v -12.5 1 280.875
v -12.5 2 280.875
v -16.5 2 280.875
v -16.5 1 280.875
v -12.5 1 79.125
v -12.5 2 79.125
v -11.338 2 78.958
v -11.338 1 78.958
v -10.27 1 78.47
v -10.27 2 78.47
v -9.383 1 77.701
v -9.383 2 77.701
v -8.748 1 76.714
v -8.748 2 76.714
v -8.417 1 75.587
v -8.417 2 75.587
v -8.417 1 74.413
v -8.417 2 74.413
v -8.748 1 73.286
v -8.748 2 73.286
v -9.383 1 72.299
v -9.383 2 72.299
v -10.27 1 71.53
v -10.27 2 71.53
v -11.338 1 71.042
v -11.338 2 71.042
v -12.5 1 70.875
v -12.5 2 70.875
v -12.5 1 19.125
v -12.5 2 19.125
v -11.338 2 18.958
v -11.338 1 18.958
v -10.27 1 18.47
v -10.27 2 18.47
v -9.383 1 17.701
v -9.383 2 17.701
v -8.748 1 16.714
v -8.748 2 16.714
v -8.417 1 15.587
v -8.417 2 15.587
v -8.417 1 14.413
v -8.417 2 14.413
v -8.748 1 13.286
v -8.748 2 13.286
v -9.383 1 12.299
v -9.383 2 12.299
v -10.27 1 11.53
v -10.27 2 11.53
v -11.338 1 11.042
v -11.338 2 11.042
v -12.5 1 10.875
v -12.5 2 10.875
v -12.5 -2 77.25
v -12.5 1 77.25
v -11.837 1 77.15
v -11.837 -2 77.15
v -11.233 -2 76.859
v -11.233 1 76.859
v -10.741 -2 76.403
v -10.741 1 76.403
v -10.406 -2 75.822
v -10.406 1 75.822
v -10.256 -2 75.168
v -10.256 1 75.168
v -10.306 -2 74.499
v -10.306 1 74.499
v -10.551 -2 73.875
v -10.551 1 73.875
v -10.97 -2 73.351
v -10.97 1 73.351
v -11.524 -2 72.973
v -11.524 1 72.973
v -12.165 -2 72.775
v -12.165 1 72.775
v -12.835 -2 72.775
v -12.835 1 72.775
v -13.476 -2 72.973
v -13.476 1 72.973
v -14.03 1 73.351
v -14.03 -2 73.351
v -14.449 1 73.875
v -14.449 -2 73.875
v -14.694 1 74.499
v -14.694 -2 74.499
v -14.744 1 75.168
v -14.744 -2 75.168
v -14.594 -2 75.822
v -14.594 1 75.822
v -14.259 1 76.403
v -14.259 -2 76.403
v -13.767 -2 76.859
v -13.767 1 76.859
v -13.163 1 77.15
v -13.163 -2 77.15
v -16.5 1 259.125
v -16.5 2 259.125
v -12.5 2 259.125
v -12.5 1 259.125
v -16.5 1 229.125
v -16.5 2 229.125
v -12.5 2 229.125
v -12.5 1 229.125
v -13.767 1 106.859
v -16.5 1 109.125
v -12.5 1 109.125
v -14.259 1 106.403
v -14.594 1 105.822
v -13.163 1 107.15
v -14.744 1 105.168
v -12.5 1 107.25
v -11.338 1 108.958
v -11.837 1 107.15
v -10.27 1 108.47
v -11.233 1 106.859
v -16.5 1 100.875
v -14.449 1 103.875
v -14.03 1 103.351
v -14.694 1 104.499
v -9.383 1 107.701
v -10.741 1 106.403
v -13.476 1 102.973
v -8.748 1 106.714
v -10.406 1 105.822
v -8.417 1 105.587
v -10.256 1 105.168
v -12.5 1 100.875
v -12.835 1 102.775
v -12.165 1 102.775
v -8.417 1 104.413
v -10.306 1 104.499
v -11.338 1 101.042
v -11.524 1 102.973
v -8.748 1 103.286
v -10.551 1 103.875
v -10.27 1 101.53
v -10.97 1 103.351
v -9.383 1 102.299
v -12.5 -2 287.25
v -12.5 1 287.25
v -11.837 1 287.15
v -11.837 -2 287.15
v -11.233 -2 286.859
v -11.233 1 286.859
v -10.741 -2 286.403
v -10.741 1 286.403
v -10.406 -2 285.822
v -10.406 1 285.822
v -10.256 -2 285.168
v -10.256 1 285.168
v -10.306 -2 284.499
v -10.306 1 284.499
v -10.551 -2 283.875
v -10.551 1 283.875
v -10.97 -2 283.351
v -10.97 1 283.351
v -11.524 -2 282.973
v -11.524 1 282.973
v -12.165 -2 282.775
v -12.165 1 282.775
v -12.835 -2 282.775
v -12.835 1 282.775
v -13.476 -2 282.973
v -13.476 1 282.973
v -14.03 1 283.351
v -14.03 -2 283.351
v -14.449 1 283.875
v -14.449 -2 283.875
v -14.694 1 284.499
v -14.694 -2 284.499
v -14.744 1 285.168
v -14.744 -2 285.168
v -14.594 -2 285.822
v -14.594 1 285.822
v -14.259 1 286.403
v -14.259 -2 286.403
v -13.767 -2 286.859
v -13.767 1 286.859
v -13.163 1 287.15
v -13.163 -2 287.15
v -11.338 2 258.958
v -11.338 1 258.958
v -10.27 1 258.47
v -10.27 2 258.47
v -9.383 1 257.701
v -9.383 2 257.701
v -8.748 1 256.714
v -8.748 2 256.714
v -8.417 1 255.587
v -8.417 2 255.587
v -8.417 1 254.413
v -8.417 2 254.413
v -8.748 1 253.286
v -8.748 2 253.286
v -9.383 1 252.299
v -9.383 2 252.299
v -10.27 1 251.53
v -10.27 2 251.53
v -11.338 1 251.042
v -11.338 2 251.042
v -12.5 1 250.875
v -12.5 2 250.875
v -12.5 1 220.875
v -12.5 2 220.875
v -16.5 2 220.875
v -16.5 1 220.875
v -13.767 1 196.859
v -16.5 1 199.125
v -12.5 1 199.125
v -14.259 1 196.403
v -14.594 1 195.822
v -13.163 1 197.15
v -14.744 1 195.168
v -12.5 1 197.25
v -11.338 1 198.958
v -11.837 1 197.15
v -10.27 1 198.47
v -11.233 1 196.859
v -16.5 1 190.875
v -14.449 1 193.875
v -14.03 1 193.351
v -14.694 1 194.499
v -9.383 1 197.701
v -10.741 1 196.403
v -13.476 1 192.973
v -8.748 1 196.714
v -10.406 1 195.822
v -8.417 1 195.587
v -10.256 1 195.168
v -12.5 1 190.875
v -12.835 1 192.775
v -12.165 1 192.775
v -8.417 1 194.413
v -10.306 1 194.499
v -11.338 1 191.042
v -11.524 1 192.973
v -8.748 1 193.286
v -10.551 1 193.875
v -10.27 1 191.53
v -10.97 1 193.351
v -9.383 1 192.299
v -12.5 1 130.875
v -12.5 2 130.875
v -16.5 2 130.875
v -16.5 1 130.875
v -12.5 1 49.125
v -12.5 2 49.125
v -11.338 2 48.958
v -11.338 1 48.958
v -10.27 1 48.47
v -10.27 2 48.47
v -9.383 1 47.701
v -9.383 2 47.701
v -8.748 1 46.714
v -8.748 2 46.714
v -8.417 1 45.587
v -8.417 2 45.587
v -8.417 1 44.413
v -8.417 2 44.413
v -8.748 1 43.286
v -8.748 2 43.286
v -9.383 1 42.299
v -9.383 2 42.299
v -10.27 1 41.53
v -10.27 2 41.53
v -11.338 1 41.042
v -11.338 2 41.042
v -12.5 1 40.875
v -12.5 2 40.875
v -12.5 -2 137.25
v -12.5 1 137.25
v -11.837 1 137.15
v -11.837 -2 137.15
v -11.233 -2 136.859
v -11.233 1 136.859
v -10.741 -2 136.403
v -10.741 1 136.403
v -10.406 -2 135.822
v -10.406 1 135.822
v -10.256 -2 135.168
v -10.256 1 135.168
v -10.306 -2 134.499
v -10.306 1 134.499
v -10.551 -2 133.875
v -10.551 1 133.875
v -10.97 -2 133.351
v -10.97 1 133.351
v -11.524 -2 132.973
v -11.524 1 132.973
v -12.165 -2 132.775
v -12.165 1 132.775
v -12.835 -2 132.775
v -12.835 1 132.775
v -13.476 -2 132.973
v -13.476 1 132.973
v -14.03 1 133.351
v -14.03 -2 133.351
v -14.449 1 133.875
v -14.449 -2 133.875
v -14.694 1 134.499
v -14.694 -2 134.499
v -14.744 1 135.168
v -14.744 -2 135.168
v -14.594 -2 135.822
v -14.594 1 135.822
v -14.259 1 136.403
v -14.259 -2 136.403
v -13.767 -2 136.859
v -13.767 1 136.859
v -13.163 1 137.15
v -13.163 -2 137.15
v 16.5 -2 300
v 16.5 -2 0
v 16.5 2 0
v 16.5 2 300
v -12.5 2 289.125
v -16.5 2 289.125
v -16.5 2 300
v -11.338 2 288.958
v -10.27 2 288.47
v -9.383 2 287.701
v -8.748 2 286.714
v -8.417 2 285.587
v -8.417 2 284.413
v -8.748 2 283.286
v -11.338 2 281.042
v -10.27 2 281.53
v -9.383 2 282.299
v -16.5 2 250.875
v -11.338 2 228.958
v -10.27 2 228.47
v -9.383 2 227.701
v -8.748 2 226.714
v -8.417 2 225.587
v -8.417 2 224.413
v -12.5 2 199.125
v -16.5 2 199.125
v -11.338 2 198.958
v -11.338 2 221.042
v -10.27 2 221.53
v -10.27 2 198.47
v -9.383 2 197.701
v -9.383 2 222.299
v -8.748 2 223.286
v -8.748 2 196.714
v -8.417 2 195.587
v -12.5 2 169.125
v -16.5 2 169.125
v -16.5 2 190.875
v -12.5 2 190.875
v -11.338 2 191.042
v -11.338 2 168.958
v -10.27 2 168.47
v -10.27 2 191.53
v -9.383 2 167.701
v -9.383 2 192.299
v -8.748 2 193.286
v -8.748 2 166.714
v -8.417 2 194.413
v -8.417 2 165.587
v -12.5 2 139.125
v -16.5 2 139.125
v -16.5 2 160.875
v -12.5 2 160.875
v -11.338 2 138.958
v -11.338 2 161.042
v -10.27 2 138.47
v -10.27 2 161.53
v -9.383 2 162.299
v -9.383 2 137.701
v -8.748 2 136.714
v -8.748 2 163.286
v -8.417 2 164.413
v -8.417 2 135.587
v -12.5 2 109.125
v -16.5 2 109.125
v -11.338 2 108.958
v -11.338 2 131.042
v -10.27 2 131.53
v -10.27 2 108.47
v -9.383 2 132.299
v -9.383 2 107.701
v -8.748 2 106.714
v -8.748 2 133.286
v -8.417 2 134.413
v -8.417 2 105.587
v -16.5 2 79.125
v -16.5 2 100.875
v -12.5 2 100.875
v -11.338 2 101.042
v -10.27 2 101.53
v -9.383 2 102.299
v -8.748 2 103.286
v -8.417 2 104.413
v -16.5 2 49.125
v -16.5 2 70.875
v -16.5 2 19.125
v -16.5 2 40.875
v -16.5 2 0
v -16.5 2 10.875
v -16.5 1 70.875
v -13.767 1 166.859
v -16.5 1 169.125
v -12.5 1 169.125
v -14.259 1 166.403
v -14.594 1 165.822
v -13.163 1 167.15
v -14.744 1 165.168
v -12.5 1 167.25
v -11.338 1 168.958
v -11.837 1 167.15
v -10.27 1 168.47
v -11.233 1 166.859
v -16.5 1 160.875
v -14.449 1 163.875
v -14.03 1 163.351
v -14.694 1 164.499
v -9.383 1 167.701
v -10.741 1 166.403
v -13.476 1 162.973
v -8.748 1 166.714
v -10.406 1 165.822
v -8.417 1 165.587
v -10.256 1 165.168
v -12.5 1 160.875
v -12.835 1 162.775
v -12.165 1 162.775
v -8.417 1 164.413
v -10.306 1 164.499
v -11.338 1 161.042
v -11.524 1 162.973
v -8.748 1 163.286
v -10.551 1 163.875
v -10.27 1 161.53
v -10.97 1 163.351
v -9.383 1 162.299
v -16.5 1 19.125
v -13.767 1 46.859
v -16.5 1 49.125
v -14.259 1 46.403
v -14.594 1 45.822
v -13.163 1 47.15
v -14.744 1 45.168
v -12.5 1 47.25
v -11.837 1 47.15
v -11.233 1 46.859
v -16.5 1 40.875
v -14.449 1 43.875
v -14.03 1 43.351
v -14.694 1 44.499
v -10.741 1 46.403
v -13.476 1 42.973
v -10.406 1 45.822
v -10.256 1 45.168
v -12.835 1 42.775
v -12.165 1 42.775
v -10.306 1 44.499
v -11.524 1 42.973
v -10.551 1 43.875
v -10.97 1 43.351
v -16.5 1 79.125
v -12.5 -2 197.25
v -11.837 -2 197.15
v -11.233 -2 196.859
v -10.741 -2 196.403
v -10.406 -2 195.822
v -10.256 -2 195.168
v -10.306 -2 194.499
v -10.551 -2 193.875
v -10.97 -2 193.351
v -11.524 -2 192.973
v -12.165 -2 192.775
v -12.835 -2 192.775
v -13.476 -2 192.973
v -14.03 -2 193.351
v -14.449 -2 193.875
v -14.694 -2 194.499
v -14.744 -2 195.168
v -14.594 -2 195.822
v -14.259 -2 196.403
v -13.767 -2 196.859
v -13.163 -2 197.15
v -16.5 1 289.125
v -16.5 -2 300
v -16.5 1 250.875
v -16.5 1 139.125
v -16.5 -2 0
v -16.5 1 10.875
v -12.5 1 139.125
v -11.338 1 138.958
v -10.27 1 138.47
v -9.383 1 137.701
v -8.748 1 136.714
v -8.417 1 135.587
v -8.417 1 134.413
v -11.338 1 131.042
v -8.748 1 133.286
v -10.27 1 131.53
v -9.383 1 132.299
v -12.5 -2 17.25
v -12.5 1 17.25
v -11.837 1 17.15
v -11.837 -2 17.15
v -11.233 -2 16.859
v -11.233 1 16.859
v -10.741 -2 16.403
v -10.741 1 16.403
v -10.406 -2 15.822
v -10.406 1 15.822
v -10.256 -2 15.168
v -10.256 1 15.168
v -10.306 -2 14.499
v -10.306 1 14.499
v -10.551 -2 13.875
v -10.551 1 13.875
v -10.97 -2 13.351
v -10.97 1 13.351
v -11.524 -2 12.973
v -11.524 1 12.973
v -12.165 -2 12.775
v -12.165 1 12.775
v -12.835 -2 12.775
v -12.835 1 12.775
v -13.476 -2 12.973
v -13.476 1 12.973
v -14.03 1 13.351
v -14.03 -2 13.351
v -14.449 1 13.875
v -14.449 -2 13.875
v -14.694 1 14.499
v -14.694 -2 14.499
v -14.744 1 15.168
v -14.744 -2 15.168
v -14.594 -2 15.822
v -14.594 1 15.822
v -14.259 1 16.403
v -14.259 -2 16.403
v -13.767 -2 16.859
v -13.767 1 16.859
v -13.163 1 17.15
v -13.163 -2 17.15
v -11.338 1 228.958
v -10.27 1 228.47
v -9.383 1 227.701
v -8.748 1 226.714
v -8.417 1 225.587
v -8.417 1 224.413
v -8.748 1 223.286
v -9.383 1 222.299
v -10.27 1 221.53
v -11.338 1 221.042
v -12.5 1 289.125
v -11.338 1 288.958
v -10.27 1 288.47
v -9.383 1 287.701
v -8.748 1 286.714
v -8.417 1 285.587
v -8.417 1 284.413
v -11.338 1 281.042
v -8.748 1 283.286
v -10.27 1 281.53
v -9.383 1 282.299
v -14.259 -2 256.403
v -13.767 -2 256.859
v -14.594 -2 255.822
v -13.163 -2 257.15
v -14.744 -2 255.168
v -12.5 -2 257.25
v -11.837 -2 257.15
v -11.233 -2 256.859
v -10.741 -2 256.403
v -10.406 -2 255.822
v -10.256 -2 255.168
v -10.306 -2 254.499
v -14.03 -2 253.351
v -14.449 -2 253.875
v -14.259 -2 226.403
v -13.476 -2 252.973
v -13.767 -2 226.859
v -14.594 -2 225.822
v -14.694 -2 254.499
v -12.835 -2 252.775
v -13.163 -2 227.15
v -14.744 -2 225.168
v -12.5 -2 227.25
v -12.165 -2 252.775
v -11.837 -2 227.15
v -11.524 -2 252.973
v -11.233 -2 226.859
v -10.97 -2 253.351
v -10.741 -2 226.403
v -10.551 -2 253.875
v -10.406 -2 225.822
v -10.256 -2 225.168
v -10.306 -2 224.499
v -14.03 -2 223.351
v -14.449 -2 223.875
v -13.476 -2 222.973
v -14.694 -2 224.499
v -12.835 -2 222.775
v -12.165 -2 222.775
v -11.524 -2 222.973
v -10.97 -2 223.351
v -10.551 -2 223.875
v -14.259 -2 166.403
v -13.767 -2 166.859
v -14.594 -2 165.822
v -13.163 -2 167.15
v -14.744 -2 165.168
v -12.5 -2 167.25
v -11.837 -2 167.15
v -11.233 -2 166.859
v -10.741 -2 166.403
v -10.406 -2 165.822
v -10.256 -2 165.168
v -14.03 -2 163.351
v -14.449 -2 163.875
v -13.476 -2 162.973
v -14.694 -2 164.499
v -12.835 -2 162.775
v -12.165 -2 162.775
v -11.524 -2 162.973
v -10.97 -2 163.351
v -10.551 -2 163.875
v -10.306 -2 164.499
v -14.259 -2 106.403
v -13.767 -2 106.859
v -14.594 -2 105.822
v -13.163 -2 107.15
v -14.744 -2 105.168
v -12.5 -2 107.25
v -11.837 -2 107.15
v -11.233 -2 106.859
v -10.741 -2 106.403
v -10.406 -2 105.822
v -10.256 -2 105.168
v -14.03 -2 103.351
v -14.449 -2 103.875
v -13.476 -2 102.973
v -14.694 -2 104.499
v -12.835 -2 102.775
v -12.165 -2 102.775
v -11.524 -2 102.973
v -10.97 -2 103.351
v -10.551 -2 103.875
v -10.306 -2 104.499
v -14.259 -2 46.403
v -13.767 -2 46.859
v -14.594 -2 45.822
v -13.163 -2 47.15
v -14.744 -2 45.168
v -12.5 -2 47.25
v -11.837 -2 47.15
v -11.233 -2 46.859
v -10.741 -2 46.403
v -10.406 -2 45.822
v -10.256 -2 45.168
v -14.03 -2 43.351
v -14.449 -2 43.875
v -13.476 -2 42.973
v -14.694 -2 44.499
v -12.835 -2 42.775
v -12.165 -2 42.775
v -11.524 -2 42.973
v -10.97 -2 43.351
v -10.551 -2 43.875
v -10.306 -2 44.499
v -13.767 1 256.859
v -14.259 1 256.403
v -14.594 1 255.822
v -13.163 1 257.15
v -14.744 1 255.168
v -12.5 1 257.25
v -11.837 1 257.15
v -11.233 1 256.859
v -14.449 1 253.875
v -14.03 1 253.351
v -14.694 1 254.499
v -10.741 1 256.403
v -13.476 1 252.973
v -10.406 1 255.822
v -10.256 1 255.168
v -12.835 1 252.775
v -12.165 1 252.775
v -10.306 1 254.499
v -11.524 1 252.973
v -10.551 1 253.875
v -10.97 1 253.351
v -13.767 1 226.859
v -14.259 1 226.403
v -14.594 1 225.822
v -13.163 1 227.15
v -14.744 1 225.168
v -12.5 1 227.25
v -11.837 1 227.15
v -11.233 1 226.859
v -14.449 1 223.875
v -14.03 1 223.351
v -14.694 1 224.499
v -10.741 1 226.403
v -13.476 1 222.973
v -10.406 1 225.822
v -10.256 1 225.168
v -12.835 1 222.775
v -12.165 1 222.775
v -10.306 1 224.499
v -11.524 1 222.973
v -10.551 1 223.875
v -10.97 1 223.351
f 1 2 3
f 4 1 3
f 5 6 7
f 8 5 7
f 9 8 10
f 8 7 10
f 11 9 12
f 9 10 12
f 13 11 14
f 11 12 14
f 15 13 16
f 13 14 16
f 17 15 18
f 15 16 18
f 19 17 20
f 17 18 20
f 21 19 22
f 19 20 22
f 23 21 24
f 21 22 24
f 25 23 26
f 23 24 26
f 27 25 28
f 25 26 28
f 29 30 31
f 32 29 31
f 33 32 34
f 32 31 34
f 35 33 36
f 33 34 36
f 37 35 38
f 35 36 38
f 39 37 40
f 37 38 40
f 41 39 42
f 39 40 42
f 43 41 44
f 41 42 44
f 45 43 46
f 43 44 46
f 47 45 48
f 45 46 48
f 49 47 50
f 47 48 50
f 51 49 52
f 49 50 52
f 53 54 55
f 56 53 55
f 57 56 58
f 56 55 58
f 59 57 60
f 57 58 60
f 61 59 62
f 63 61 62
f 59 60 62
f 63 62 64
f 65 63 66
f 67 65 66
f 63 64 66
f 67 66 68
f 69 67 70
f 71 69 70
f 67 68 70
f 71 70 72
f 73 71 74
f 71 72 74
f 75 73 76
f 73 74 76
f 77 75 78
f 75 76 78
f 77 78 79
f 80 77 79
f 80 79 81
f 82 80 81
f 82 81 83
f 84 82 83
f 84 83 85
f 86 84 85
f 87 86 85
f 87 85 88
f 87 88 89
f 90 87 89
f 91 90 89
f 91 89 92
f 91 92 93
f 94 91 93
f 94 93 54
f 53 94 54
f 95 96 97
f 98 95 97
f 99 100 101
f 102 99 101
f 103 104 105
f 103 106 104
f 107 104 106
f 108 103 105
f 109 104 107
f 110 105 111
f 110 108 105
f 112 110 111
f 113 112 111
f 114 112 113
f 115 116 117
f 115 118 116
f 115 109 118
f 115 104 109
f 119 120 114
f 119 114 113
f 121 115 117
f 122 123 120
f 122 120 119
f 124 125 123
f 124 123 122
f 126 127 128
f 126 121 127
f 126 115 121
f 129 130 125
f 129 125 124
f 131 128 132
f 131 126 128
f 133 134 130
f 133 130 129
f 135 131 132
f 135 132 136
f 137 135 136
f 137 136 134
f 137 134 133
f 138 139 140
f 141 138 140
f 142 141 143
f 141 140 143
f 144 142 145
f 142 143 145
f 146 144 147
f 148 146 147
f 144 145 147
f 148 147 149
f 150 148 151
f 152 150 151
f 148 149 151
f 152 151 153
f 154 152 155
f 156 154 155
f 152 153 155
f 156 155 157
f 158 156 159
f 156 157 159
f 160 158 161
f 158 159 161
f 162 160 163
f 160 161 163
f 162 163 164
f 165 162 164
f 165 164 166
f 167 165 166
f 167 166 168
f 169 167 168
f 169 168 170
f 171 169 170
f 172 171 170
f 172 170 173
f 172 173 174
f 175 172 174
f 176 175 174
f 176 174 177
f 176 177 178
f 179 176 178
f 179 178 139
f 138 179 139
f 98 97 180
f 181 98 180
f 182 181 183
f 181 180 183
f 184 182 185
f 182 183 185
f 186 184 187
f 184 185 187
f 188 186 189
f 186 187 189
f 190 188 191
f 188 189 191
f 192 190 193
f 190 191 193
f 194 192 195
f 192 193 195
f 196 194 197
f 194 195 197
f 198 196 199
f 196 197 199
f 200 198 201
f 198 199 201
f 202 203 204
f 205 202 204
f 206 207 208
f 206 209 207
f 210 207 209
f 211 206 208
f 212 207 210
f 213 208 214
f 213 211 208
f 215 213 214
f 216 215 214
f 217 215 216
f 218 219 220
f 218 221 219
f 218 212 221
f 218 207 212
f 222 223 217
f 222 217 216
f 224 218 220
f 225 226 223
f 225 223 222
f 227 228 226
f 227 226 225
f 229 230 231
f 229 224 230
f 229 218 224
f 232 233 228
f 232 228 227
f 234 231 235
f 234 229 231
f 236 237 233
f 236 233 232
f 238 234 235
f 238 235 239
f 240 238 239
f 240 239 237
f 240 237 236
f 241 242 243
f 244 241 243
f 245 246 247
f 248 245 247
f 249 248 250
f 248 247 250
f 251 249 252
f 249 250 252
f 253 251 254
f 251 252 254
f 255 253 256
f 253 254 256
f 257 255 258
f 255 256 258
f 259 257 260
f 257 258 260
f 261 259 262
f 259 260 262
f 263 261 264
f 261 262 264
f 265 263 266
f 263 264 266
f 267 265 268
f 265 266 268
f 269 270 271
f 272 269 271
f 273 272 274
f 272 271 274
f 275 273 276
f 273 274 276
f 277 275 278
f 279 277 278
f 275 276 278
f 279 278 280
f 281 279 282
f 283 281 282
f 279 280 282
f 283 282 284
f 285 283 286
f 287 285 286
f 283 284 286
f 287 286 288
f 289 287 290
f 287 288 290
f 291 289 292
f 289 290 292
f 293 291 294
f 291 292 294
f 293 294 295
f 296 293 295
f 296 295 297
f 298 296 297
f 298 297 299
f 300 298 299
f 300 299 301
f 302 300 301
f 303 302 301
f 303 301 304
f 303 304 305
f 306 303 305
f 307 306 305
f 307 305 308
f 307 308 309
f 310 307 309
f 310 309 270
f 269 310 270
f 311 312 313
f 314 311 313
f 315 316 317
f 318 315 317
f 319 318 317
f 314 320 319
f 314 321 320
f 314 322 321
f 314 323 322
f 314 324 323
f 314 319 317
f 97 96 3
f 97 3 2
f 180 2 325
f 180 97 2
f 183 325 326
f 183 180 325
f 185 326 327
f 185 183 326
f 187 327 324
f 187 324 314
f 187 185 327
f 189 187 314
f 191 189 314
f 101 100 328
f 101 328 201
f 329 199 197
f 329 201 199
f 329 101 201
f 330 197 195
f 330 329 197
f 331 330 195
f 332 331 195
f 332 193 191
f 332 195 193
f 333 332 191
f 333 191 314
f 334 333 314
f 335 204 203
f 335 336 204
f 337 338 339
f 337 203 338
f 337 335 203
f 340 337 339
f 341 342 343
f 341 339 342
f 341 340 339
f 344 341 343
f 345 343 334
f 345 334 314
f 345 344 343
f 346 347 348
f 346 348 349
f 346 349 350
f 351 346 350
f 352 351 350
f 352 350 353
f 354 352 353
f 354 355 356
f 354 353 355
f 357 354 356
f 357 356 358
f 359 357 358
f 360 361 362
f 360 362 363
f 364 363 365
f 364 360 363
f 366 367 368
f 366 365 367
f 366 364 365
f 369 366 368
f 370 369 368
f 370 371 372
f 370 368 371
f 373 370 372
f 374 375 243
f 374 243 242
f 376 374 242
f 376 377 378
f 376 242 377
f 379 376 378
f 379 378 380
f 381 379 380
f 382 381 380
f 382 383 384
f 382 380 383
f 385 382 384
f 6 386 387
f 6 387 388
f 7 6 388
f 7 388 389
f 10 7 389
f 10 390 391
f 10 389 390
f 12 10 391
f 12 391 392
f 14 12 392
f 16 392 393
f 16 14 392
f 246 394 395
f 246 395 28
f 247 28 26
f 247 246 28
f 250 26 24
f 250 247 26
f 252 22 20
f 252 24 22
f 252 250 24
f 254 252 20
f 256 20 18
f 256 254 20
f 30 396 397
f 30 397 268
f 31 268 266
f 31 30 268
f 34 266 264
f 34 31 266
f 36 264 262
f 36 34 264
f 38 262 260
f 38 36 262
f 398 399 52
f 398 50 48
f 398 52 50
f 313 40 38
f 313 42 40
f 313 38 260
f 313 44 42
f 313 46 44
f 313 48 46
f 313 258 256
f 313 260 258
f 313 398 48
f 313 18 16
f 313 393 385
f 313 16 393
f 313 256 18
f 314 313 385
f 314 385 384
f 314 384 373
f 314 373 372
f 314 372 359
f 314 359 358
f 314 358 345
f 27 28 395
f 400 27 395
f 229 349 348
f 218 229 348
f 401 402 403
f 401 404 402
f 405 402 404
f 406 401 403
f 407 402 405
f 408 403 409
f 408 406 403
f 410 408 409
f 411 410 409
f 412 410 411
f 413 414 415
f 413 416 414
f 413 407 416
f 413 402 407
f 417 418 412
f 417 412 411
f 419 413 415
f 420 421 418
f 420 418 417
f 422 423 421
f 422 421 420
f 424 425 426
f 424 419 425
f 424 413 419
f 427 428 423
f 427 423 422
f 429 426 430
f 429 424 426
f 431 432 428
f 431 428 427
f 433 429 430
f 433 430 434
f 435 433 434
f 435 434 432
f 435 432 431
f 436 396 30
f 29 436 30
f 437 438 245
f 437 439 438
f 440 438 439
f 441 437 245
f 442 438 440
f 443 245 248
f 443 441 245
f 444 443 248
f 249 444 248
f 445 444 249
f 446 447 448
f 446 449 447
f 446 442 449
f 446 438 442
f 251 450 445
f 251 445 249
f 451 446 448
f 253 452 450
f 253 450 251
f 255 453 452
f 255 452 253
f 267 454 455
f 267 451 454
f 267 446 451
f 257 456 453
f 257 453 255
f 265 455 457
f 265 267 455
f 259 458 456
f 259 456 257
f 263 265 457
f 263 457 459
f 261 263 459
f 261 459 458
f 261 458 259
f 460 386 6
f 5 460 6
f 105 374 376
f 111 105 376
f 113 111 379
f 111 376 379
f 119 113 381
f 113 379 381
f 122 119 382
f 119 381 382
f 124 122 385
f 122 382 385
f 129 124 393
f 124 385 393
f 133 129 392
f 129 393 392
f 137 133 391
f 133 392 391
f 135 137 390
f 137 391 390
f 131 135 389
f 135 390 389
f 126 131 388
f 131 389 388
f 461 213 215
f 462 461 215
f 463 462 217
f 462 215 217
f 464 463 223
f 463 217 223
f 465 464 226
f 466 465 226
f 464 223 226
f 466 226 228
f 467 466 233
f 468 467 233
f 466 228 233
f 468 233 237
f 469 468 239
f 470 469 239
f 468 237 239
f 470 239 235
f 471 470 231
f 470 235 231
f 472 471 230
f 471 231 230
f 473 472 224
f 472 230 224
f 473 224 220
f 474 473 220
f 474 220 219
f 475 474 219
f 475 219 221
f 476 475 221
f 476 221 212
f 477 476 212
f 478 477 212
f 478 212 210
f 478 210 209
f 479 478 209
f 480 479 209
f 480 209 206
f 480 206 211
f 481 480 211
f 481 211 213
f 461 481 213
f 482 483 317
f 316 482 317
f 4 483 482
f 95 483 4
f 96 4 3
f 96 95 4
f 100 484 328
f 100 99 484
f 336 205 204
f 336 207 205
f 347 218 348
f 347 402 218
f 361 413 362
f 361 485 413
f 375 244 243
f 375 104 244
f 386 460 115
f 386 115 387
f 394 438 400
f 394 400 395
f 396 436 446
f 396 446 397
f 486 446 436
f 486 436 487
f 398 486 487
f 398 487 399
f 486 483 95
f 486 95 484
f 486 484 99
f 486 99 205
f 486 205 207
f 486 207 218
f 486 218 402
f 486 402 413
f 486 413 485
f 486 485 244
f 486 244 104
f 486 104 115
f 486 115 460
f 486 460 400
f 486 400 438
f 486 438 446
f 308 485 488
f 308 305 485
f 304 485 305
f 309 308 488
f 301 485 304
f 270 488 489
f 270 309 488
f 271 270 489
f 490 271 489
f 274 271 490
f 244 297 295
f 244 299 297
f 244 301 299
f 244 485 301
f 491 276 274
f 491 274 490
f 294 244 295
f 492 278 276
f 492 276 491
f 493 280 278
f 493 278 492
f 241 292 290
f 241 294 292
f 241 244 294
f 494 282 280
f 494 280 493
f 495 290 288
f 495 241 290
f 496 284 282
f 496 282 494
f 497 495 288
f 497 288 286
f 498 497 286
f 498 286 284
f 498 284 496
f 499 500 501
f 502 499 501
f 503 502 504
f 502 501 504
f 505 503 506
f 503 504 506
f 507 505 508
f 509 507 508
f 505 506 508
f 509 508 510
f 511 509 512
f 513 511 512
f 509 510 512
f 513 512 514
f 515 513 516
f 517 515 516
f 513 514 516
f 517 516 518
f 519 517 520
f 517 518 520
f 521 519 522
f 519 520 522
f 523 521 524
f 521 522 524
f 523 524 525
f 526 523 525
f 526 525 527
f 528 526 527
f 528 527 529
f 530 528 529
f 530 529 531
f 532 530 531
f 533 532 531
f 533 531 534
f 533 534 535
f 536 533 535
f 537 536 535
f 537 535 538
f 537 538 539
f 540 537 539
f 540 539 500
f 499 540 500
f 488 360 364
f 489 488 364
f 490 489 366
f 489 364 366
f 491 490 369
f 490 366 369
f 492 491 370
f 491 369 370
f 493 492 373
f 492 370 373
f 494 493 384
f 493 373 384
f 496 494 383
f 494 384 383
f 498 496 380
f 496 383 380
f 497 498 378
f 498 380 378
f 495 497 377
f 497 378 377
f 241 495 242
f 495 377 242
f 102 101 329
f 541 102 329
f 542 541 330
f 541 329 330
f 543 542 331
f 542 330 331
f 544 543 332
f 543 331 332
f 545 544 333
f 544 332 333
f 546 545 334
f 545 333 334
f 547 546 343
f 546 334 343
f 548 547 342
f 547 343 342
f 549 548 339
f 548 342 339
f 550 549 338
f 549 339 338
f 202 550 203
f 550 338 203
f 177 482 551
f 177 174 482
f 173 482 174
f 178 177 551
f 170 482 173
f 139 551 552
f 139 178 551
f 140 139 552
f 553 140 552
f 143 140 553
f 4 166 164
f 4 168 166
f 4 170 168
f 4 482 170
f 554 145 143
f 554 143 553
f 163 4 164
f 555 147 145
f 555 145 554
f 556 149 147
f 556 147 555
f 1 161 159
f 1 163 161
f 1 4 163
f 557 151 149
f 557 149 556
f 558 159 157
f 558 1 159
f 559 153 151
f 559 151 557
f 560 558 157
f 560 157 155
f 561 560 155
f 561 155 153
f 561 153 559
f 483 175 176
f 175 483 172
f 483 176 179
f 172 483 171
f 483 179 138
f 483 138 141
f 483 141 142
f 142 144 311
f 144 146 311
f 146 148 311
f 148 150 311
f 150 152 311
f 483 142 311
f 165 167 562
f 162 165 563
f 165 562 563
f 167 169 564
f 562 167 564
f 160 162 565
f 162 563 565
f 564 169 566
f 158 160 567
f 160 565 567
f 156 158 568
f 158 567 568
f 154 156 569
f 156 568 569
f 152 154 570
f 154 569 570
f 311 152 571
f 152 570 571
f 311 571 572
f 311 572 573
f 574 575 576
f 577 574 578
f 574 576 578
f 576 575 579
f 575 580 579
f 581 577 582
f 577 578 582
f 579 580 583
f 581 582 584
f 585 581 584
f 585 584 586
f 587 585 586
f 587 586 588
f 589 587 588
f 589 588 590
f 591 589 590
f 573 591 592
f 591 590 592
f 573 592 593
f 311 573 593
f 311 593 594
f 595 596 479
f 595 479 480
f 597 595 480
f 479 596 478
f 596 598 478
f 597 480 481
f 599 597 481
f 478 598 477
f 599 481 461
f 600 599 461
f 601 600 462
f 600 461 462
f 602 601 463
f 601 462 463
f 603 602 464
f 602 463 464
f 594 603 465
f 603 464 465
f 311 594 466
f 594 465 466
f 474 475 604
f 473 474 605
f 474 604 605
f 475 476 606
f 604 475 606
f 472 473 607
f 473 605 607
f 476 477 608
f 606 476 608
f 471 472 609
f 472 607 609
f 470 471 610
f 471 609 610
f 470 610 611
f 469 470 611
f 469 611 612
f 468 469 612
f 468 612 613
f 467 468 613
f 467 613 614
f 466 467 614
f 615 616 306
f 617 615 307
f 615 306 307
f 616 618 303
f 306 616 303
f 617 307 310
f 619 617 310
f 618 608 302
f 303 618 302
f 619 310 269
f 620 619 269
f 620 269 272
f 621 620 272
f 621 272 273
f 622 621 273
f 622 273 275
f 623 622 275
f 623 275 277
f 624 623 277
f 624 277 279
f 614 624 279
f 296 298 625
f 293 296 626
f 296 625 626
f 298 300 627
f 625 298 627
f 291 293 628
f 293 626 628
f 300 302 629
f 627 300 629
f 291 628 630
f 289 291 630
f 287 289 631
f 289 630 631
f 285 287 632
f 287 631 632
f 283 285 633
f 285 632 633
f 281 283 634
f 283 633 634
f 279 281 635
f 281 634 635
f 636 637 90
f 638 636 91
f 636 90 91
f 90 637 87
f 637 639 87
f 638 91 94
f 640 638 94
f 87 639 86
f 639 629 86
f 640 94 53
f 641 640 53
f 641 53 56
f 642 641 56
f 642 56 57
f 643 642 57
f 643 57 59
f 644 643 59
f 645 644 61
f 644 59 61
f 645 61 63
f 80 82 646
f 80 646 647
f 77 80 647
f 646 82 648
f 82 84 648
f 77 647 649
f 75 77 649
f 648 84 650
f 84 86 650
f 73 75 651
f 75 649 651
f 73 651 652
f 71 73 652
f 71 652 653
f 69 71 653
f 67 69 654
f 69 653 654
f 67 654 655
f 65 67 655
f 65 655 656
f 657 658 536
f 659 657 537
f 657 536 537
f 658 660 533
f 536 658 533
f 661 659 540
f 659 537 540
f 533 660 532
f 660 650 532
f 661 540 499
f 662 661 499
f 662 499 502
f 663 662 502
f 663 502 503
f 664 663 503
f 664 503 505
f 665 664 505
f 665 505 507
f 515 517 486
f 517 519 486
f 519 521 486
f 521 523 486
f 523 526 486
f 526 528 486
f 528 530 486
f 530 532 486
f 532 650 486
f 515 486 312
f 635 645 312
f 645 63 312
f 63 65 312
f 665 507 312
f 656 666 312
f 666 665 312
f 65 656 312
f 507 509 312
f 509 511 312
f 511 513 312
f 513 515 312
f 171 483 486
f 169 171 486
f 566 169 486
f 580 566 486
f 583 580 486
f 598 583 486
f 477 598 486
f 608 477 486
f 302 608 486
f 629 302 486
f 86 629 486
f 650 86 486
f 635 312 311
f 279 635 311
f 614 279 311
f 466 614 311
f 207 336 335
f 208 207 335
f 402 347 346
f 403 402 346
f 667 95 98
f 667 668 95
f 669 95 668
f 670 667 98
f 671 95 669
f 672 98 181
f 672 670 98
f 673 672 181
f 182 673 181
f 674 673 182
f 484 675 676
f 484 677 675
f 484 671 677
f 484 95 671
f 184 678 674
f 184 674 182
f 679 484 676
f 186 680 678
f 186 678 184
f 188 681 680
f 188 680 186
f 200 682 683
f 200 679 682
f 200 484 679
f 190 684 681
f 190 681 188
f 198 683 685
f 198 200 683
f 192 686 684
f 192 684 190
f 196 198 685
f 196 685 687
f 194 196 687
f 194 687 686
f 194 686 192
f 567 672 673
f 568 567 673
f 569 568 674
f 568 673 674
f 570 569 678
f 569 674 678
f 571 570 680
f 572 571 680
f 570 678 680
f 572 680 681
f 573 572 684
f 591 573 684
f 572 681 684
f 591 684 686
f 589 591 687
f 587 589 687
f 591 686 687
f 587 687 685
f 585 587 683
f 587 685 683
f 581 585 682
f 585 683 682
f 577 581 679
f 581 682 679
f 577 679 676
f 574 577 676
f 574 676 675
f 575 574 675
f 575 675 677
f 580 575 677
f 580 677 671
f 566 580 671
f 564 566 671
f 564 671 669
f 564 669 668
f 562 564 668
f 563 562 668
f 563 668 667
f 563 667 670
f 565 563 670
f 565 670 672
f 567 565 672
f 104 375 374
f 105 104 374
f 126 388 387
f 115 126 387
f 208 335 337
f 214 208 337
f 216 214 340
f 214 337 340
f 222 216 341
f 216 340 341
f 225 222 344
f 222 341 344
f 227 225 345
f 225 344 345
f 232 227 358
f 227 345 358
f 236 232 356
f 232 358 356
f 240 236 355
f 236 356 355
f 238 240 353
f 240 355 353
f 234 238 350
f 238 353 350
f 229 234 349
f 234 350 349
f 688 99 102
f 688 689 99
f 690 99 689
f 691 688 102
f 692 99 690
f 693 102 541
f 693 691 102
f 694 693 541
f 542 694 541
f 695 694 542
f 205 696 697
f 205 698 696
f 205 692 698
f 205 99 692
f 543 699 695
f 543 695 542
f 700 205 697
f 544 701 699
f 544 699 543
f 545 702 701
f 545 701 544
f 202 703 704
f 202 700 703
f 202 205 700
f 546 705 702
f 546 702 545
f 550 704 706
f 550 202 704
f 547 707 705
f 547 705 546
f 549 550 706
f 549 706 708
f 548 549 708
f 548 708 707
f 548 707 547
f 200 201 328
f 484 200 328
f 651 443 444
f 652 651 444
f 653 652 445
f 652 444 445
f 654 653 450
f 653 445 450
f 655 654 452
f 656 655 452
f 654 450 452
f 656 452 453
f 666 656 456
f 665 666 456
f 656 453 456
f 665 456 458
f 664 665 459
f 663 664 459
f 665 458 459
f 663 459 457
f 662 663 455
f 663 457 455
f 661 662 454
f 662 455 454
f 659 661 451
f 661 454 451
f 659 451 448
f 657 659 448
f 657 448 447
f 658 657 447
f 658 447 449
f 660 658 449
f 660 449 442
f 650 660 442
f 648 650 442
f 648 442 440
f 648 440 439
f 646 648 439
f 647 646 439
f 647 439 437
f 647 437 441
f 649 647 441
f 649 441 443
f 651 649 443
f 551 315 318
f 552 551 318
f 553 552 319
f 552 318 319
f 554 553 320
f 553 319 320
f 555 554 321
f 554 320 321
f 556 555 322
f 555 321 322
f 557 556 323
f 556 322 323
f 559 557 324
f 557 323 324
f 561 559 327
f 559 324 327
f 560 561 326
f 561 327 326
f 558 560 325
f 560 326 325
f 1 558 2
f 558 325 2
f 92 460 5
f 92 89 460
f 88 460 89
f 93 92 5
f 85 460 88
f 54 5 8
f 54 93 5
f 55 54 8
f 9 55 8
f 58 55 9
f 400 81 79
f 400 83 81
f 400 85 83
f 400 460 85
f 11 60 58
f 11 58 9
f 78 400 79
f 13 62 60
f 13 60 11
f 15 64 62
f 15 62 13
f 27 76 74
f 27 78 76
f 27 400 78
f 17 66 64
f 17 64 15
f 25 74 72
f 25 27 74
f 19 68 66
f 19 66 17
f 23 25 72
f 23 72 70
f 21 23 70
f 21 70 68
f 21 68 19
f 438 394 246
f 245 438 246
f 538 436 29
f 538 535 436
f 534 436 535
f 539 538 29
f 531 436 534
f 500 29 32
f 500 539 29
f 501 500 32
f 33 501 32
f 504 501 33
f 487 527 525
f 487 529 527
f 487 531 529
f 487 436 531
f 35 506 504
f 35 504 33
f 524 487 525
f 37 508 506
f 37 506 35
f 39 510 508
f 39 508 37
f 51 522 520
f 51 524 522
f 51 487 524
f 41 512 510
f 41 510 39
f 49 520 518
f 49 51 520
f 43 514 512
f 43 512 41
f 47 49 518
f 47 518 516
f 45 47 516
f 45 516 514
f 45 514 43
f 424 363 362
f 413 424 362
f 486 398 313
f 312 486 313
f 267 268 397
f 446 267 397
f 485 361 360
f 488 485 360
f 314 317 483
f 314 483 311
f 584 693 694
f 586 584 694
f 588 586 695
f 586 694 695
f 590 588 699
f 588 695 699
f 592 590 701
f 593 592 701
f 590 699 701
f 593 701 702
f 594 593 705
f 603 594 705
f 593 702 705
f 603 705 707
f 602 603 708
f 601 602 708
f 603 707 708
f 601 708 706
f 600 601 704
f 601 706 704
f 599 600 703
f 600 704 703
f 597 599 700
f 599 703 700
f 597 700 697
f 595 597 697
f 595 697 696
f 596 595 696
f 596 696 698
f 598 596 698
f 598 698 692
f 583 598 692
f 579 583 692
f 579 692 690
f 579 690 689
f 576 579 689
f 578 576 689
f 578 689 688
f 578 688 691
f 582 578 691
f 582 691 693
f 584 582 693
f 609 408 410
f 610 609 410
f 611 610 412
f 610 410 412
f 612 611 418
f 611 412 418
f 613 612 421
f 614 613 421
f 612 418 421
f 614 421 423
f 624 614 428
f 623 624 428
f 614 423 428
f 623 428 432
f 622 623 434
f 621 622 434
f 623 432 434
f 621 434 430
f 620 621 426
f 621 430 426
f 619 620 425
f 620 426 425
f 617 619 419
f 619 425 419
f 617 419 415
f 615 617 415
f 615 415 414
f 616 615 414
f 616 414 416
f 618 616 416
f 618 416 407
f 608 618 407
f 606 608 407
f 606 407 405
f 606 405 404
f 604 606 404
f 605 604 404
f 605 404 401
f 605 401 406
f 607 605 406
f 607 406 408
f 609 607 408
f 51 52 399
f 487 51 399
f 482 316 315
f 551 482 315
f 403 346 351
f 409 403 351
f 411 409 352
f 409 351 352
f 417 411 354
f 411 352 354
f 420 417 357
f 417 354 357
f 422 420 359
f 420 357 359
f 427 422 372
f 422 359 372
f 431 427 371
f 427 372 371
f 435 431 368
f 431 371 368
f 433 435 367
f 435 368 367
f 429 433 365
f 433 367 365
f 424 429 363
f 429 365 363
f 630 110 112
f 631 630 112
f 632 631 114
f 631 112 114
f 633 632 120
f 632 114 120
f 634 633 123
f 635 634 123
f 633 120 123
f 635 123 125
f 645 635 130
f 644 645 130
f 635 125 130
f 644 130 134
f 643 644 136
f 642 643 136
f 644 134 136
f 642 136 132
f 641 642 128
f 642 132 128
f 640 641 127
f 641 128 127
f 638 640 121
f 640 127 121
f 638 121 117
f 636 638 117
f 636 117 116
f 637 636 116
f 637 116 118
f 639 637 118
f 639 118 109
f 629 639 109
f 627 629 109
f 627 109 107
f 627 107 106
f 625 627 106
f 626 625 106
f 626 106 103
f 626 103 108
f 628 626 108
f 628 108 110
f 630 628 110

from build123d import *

# Parameters (mm, degrees)
SKETCH1_W           = 33
SKETCH1_H           = 4
BOSS_EXTRUDE2_DEPTH = 300
CUT_EXTRUDE2_DEPTH  = 1
SKETCH5_R           = 2.25
CUT_EXTRUDE3_DEPTH  = 301.46838436
LPATTERN1_COUNT     = 10
LPATTERN1_PITCH     = 30


with BuildPart() as part:
    # Sketch1 → Boss-Extrude2 (new body)
    with BuildSketch(Plane.XY):
        Rectangle(SKETCH1_W, SKETCH1_H)
    extrude(amount=BOSS_EXTRUDE2_DEPTH)

    # Sketch2 → Cut-Extrude2 (cut)
    with BuildSketch(Plane(origin=(0, 2, 0), x_dir=(1, 0, 0), z_dir=(0, 1, 0))):
        with BuildLine():
            Line((-12.5, -10.875), (-16.5, -10.875))
            Line((-16.5, -10.875), (-16.5, -19.125))
            Line((-16.5, -19.125), (-12.5, -19.125))
            ThreePointArc((-12.5, -19.125), (-8.375, -15), (-12.5, -10.875))
        make_face()
    cut_extrude2 = extrude(amount=-CUT_EXTRUDE2_DEPTH, mode=Mode.SUBTRACT)

    # Sketch5 → Cut-Extrude3 (cut, through all)
    with BuildSketch(Plane(origin=(0, 1, 0), x_dir=(1, 0, 0), z_dir=(0, 1, 0))):
        with Locations(Location((-12.5, -15, 0), (0, 0, 270))):
            Circle(SKETCH5_R)
    cut_extrude3 = extrude(amount=-CUT_EXTRUDE3_DEPTH, mode=Mode.SUBTRACT)

    # LPattern1: Cut-Extrude2, Cut-Extrude3 ×10
    with Locations(*[(0, 0, i * LPATTERN1_PITCH) for i in range(1, LPATTERN1_COUNT)]):
        add(cut_extrude2, mode=Mode.SUBTRACT)
        add(cut_extrude3, mode=Mode.SUBTRACT)


solid = part.part
